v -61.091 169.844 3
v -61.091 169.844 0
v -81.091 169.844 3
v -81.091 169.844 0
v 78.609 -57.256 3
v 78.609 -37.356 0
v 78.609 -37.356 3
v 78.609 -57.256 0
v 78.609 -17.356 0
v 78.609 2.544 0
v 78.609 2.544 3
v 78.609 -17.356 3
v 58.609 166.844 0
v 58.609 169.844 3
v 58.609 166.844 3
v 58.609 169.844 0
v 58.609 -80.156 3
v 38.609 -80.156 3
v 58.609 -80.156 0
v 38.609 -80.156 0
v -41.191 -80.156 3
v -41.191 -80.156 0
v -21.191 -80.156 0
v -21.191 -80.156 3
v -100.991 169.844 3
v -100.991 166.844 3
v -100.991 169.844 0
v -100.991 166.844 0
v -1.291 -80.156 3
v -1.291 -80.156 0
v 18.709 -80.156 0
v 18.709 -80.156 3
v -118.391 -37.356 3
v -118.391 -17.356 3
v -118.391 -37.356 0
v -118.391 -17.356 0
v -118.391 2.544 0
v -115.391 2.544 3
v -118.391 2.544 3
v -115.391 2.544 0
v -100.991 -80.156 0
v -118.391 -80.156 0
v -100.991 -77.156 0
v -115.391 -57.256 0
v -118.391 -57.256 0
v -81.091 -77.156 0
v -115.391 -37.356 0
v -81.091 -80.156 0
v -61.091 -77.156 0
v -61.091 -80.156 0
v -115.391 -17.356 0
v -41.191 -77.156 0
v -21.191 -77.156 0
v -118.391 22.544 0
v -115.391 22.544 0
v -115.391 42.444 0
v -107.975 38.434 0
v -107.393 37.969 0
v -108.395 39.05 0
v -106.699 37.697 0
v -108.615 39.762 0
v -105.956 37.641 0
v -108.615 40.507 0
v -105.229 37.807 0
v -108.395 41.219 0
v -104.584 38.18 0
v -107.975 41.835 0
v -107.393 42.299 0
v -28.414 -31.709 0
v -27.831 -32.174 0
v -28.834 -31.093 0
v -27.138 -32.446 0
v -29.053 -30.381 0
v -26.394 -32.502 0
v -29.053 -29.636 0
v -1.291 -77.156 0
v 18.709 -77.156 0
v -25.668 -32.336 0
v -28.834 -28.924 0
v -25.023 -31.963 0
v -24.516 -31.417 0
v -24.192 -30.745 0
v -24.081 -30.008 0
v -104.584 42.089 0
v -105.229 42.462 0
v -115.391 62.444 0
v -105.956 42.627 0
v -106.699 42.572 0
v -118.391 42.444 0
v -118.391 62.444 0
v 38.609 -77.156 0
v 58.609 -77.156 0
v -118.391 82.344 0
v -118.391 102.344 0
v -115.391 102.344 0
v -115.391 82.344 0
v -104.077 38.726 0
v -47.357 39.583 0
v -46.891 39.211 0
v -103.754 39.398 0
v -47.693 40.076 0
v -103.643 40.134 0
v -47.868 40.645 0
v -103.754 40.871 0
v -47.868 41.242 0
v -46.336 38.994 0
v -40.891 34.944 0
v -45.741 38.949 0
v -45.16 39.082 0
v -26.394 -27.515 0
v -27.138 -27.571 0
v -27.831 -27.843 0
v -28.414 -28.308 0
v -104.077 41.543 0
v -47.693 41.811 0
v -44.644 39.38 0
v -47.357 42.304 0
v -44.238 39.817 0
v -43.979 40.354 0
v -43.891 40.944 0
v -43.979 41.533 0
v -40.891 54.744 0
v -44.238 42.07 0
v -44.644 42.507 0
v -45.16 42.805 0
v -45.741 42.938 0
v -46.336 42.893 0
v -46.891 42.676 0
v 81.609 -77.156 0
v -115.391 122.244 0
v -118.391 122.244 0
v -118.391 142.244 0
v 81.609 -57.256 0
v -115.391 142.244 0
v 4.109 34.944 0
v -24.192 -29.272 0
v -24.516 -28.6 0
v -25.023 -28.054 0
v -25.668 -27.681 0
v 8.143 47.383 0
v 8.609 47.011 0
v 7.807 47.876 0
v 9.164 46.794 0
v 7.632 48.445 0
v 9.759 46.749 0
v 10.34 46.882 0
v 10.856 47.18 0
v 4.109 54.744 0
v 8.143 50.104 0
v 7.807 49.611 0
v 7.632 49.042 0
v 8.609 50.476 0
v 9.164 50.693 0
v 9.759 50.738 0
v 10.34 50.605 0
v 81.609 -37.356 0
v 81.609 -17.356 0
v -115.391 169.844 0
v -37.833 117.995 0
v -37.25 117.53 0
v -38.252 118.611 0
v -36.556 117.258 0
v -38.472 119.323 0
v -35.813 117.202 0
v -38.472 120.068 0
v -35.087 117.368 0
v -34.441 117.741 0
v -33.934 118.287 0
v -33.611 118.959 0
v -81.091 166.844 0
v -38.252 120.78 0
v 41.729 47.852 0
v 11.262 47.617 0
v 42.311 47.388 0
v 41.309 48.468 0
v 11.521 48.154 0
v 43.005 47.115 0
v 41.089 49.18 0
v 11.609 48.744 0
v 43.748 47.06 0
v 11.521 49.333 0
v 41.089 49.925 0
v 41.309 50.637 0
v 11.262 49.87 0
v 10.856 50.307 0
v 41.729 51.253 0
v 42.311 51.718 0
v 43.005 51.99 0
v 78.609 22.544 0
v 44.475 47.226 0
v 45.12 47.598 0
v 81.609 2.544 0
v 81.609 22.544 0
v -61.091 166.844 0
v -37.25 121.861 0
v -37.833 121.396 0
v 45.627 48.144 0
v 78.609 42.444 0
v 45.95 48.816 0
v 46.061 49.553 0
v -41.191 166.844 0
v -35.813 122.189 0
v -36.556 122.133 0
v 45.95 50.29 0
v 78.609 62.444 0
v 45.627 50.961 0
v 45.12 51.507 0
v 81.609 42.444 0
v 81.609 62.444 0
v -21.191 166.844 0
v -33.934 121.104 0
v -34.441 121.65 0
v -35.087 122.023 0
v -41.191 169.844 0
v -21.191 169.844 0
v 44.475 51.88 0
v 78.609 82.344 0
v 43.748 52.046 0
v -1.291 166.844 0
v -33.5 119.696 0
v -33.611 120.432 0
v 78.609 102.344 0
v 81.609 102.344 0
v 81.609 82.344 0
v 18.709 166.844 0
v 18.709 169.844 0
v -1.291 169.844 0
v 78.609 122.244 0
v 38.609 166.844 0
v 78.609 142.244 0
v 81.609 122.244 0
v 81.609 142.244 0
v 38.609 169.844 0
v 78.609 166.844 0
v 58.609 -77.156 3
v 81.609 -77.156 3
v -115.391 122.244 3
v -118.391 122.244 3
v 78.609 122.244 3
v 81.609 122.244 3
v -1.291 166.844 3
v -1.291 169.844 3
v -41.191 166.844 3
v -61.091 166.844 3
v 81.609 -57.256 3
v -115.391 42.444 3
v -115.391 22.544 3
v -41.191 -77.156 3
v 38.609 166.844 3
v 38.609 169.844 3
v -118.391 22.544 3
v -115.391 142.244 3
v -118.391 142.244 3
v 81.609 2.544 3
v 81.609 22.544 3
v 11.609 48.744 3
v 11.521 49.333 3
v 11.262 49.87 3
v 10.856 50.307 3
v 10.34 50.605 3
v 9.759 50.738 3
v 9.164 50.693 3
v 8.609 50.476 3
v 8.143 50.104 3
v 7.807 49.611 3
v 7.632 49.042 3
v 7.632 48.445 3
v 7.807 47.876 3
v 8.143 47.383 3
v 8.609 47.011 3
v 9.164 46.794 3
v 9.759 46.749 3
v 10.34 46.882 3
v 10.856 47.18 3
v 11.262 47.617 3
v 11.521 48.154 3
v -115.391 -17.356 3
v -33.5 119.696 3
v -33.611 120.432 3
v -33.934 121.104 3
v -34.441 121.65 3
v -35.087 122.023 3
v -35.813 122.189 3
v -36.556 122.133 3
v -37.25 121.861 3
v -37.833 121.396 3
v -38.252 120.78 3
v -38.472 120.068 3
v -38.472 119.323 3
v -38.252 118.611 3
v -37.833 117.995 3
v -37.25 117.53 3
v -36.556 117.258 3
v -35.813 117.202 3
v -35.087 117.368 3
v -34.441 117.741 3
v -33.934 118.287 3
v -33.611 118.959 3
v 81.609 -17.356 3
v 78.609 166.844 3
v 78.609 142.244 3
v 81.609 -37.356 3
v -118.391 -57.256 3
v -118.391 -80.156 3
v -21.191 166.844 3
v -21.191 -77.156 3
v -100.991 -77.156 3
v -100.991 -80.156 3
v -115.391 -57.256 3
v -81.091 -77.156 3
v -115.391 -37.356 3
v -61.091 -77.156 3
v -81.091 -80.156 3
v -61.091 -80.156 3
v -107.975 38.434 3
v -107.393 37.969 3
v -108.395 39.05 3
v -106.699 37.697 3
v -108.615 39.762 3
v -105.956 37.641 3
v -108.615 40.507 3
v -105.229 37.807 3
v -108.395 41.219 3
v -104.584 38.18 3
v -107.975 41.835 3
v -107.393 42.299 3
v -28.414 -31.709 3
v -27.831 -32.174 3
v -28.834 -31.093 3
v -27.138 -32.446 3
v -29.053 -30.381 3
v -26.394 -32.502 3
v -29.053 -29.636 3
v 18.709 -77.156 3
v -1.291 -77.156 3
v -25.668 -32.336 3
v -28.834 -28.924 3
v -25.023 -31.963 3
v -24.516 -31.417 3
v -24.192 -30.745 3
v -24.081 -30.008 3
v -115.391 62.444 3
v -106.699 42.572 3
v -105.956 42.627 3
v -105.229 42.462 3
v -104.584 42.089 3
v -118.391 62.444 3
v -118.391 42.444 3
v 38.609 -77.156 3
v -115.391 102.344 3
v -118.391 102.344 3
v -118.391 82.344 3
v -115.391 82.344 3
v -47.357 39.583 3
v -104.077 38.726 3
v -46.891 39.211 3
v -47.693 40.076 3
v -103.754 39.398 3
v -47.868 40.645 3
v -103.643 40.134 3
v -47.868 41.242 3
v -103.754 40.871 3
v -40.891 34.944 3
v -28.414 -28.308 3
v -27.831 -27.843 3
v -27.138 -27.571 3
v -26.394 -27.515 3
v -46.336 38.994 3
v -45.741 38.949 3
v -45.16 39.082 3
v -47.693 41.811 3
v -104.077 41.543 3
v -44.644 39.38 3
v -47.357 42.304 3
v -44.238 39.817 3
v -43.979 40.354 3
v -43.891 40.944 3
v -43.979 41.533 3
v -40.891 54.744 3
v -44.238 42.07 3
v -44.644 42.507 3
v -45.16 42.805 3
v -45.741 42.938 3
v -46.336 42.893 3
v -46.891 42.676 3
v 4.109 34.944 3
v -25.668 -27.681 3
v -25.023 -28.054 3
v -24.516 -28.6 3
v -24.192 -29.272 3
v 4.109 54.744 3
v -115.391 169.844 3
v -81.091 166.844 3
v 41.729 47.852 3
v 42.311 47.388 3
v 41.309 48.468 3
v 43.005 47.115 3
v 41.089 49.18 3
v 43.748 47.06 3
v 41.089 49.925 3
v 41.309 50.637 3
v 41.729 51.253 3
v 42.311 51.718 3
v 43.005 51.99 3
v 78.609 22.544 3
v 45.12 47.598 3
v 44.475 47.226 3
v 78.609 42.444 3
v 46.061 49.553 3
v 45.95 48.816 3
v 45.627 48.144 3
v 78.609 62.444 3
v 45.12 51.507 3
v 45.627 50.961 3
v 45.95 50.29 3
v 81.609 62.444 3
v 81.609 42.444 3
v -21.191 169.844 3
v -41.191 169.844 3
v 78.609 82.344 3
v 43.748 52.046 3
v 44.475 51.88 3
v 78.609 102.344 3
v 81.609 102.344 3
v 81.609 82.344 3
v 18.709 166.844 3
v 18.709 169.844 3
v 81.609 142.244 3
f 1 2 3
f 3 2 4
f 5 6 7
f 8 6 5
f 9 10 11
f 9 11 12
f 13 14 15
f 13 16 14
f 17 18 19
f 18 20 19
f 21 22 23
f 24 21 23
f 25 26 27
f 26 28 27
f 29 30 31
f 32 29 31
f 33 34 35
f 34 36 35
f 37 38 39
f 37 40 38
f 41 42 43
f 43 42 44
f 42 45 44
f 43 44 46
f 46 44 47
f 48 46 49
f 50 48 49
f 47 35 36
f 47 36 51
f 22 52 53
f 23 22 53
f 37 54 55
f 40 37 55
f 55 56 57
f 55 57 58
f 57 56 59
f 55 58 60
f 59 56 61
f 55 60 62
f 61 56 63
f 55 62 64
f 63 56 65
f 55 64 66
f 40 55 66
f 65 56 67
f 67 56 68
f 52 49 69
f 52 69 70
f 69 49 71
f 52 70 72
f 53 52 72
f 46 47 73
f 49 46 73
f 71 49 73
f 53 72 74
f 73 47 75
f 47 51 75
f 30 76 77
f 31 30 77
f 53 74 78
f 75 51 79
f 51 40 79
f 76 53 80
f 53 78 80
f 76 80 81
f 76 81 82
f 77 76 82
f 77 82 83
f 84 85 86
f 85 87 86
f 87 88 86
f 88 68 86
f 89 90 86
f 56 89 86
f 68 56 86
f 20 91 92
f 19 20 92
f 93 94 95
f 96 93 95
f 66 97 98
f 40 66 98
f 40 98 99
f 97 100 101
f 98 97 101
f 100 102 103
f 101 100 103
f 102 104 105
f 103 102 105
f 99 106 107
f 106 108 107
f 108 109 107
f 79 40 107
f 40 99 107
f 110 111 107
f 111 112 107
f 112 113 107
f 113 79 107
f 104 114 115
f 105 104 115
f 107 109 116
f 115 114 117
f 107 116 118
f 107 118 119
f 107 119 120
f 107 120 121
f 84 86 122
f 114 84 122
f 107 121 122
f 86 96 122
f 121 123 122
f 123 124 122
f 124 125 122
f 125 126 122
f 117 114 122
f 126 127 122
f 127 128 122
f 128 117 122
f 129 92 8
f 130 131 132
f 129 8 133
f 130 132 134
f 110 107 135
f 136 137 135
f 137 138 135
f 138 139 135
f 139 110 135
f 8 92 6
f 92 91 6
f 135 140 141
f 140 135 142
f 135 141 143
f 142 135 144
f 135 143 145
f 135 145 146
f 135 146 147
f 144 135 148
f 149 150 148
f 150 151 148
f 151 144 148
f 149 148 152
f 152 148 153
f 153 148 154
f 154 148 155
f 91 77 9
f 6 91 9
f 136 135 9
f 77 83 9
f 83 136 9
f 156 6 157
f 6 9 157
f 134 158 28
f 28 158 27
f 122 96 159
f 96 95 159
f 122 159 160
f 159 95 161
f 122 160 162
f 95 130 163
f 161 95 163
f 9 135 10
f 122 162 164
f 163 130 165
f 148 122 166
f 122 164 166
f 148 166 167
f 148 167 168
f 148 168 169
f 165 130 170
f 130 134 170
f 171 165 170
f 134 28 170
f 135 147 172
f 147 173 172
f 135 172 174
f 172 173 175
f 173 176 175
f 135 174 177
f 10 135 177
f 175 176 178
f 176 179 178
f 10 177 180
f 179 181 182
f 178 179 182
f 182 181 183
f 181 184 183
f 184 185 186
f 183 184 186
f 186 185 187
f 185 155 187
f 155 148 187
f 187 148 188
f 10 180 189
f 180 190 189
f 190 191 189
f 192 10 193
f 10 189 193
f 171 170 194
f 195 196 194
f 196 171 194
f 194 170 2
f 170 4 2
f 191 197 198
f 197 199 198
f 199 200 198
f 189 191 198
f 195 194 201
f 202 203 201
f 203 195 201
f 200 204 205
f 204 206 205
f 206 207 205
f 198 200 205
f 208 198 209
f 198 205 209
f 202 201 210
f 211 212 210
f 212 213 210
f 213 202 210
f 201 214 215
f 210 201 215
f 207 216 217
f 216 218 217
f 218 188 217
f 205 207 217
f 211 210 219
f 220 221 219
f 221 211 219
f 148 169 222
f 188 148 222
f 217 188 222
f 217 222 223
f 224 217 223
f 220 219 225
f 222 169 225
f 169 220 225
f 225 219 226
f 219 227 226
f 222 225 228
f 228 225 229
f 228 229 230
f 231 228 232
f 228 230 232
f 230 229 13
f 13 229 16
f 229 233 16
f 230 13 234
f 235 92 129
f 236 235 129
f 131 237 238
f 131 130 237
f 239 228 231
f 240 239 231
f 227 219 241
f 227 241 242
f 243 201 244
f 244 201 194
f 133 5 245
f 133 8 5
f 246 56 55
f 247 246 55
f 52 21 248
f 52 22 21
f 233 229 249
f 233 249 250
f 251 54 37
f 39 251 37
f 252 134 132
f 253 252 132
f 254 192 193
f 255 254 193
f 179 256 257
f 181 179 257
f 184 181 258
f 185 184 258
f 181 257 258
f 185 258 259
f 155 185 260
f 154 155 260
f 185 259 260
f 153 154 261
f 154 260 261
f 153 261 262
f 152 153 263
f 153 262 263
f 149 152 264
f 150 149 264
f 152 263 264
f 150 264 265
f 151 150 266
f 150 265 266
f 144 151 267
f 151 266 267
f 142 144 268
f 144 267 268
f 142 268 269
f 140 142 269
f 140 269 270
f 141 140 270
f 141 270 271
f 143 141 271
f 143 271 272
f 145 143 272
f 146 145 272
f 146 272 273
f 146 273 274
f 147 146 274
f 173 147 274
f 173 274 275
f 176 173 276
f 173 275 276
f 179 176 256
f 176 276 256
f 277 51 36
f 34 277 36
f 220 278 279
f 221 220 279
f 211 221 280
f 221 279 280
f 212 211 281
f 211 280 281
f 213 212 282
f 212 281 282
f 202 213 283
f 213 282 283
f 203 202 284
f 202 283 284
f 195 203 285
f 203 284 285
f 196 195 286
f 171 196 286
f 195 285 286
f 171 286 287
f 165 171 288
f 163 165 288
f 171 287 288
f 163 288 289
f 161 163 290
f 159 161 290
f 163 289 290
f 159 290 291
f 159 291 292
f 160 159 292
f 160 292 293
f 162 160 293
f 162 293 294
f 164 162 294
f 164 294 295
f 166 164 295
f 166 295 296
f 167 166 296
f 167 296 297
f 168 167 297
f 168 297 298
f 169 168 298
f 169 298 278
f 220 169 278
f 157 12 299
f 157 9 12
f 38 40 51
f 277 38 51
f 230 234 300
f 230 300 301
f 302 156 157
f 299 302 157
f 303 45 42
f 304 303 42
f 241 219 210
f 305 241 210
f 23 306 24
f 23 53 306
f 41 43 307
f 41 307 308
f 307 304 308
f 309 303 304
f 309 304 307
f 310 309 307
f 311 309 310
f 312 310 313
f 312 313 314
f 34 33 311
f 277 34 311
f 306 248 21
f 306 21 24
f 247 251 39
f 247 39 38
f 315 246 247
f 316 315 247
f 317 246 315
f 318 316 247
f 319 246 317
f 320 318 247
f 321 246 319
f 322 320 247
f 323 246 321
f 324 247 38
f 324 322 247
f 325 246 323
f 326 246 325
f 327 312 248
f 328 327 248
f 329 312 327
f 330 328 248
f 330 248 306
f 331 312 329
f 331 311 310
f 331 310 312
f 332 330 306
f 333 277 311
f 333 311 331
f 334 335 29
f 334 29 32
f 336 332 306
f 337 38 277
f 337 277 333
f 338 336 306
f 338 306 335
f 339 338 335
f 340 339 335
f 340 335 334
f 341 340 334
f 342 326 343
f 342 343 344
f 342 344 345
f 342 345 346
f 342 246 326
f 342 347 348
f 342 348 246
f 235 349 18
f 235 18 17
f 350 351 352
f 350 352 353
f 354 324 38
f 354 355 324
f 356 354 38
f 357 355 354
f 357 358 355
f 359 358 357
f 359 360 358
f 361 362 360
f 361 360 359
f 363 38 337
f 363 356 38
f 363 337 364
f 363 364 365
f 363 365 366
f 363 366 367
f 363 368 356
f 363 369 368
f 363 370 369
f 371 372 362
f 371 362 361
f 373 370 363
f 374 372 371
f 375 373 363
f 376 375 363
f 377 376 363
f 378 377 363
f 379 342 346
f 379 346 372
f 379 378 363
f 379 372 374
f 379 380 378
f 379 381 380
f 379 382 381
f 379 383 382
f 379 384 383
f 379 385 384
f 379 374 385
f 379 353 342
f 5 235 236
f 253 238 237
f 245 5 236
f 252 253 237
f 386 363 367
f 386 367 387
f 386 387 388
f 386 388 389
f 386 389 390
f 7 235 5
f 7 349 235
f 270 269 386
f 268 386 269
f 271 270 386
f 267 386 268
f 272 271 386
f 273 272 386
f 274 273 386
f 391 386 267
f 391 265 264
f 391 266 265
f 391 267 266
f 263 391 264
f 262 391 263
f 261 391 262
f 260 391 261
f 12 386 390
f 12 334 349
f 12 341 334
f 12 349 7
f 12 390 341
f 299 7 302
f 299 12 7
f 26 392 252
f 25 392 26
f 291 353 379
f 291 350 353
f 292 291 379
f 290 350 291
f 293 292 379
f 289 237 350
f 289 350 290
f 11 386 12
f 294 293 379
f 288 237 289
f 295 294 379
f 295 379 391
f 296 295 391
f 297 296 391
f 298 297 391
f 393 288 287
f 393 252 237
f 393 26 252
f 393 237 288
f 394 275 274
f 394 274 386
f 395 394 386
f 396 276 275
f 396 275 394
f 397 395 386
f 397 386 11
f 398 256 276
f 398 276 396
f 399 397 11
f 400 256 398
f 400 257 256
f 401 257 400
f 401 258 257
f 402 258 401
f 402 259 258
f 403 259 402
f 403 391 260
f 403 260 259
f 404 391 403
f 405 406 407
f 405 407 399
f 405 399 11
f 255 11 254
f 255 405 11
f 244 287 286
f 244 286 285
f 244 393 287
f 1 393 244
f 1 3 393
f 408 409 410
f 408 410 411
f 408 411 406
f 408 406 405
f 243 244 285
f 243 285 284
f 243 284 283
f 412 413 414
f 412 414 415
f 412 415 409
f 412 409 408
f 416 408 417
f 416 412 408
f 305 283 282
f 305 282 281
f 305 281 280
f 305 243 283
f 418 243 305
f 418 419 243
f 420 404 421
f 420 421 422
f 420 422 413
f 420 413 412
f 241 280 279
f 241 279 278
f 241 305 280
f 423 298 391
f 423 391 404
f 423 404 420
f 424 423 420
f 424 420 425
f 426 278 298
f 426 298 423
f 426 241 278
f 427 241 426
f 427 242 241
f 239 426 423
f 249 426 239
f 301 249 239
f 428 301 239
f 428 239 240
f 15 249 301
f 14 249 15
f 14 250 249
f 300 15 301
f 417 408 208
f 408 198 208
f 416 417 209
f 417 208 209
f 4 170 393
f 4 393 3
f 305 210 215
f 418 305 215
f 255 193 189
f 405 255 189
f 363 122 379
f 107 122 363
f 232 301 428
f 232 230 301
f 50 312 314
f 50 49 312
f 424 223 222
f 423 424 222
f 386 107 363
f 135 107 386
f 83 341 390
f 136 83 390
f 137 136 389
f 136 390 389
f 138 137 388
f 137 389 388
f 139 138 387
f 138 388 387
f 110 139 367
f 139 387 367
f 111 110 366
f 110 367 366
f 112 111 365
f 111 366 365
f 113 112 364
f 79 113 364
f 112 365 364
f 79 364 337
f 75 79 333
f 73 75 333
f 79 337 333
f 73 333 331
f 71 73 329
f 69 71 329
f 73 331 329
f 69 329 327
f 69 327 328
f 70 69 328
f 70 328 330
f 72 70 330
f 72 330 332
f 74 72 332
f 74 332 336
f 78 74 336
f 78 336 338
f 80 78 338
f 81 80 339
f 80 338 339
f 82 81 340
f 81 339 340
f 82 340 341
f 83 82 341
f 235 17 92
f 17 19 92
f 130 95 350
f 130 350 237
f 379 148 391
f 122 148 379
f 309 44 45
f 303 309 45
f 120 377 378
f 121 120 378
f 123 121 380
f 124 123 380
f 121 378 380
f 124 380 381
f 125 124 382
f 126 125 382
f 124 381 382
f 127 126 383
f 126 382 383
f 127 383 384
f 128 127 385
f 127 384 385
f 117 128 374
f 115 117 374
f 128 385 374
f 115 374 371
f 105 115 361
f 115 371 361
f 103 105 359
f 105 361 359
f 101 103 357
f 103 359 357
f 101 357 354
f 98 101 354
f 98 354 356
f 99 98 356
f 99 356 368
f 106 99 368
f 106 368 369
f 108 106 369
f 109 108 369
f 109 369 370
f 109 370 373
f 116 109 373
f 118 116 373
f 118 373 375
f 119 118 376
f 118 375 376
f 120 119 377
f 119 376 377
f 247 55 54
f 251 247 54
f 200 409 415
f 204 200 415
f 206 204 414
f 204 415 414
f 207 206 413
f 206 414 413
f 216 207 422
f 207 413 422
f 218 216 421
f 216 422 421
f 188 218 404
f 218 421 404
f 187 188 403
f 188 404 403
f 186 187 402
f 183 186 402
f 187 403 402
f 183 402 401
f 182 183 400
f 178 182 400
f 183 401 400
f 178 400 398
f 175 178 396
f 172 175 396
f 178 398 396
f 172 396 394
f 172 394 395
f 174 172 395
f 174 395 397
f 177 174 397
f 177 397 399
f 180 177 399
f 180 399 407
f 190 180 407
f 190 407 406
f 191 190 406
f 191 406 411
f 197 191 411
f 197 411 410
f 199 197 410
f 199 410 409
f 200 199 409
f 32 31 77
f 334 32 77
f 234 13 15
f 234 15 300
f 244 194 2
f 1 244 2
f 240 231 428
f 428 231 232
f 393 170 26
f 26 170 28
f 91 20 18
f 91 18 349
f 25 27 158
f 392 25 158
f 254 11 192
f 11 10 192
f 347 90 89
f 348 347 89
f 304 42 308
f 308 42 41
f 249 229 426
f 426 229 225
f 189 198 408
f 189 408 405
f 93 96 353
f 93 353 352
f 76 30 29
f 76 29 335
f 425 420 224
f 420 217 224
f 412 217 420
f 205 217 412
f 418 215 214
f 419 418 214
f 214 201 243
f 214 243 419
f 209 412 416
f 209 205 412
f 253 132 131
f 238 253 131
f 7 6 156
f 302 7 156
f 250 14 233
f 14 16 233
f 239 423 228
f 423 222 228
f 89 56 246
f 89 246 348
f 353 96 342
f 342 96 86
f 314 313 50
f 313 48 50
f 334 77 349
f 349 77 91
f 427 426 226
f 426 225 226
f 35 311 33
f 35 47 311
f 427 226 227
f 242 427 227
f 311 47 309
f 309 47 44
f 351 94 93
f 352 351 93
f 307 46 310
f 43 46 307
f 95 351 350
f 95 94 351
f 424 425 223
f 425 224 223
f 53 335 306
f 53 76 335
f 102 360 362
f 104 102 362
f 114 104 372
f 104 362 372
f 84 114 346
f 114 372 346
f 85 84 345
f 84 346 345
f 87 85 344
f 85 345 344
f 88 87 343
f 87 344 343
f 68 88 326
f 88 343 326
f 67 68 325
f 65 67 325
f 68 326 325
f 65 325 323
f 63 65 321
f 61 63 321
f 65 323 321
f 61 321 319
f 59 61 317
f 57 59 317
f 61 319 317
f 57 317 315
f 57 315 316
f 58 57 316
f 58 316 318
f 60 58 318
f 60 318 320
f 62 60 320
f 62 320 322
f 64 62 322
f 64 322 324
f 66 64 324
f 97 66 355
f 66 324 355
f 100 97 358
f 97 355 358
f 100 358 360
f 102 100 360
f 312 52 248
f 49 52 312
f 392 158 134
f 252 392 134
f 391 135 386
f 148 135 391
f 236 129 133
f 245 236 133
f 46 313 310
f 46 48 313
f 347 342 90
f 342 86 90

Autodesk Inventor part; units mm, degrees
ref_plane "YZ Plane" through (0, 0, 0) normal (1, 0, 0) x (0, 1, 0)
ref_plane "XZ Plane" through (0, 0, 0) normal (0, 1, 0) x (-1, 0, 0)
ref_plane "XY Plane" through (0, 0, 0) normal (0, 0, 1) x (1, 0, 0)
sketch "Sketch1" plane through (0, 0, 0) normal (0, 0, 1) x (1, 0, 0)
  line L0 (81.6094, 169.8435) -> (-118.3906, 169.8435)
  line L1 (-118.3906, 169.8435) -> (-118.3906, -80.1565)
  line L2 (-118.3906, -80.1565) -> (81.6094, -80.1565)
  line L3 (81.6094, -80.1565) -> (81.6094, 169.8435)
  line L4 (81.6094, 169.8435) -> (58.6094, 169.8435)
  line L5 (58.6094, 169.8435) -> (58.6094, 166.8435)
  line L6 (58.6094, 166.8435) -> (81.6094, 166.8435)
  line L7 (81.6094, 166.8435) -> (81.6094, 169.8435)
  line L8 (58.6094, 166.8435) -> (38.6094, 166.8435)
  line L9 (38.6094, 166.8435) -> (38.6094, 169.8435)
  line L10 (38.6094, 169.8435) -> (58.6094, 169.8435)
  line L11 (58.6094, 169.8435) -> (58.6094, 166.8435)
  line L12 (38.6094, 166.8435) -> (18.7094, 166.8435)
  line L13 (18.7094, 166.8435) -> (18.7094, 169.8435)
  line L14 (18.7094, 169.8435) -> (38.6094, 169.8435)
  line L15 (38.6094, 169.8435) -> (38.6094, 166.8435)
  line L16 (18.7094, 166.8435) -> (-1.2906, 166.8435)
  line L17 (-1.2906, 166.8435) -> (-1.2906, 169.8435)
  line L18 (-1.2906, 169.8435) -> (18.7094, 169.8435)
  line L19 (18.7094, 169.8435) -> (18.7094, 166.8435)
  line L20 (-1.2906, 166.8435) -> (-21.1906, 166.8435)
  line L21 (-21.1906, 166.8435) -> (-21.1906, 169.8435)
  line L22 (-21.1906, 169.8435) -> (-1.2906, 169.8435)
  line L23 (-1.2906, 169.8435) -> (-1.2906, 166.8435)
  line L24 (-21.1906, 166.8435) -> (-41.1906, 166.8435)
  line L25 (-41.1906, 166.8435) -> (-41.1906, 169.8435)
  line L26 (-41.1906, 169.8435) -> (-21.1906, 169.8435)
  line L27 (-21.1906, 169.8435) -> (-21.1906, 166.8435)
  line L28 (-111.1906, 169.8435) -> (-91.1906, 169.8435)
  line L29 (-91.1906, 169.8435) -> (-118.3906, 169.8435)
  line L30 (-118.3906, 169.8435) -> (-118.3906, 166.8435)
  line L31 (-118.3906, 166.8435) -> (-115.3906, 166.8435)
  line L32 (-118.3906, 142.8435) -> (-118.3906, 166.8435)
  line L33 (-118.3906, 169.8435) -> (-115.3906, 169.8435)
  line L34 (-115.3906, 169.8435) -> (-115.3906, 142.2435)
  line L35 (-115.3906, 142.2435) -> (-118.3906, 142.2435)
  line L36 (-118.3906, 142.2435) -> (-118.3906, 169.8435)
  line L37 (-118.3906, 142.2435) -> (-115.3906, 142.2435)
  line L38 (-115.3906, 142.2435) -> (-115.3906, 122.2435)
  line L39 (-115.3906, 122.2435) -> (-118.3906, 122.2435)
  line L40 (-118.3906, 122.2435) -> (-118.3906, 142.2435)
  line L41 (-115.3906, 122.2435) -> (-118.3906, 122.2435)
  line L42 (-118.3906, 122.2435) -> (-118.3906, 102.3435)
  line L43 (-118.3906, 102.3435) -> (-115.3906, 102.3435)
  line L44 (-115.3906, 102.3435) -> (-115.3906, 122.2435)
  line L45 (-118.3906, 102.3435) -> (-115.3906, 102.3435)
  line L46 (-115.3906, 102.3435) -> (-115.3906, 82.3435)
  line L47 (-115.3906, 82.3435) -> (-118.3906, 82.3435)
  line L48 (-118.3906, 82.3435) -> (-118.3906, 102.3435)
  line L49 (-118.3906, 82.3435) -> (-115.3906, 82.3435)
  line L50 (-115.3906, 82.3435) -> (-115.3906, 62.4435)
  line L51 (-115.3906, 62.4435) -> (-118.3906, 62.4435)
  line L52 (-118.3906, 62.4435) -> (-118.3906, 82.3435)
  line L53 (-118.3906, 62.4435) -> (-115.3906, 62.4435)
  line L54 (-115.3906, 62.4435) -> (-115.3906, 42.4435)
  line L55 (-115.3906, 42.4435) -> (-118.3906, 42.4435)
  line L56 (-118.3906, 42.4435) -> (-118.3906, 62.4435)
  line L57 (-118.3906, 42.4435) -> (-115.3906, 42.4435)
  line L58 (-115.3906, 42.4435) -> (-115.3906, 22.5435)
  line L59 (-115.3906, 22.5435) -> (-118.3906, 22.5435)
  line L60 (-118.3906, 22.5435) -> (-118.3906, 42.4435)
  line L61 (-118.3906, 22.5435) -> (-115.3906, 22.5435)
  line L62 (-115.3906, 22.5435) -> (-115.3906, 2.5435)
  line L63 (-115.3906, 2.5435) -> (-118.3906, 2.5435)
  line L64 (-118.3906, 2.5435) -> (-118.3906, 22.5435)
  line L65 (-118.3906, 2.5435) -> (-115.3906, 2.5435)
  line L66 (-115.3906, 2.5435) -> (-115.3906, -17.3565)
  line L67 (-115.3906, -17.3565) -> (-118.3906, -17.3565)
  line L68 (-118.3906, -17.3565) -> (-118.3906, 2.5435)
  line L69 (-118.3906, -17.3565) -> (-115.3906, -17.3565)
  line L70 (-115.3906, -17.3565) -> (-115.3906, -37.3565)
  line L71 (-115.3906, -37.3565) -> (-118.3906, -37.3565)
  line L72 (-118.3906, -37.3565) -> (-118.3906, -17.3565)
  line L73 (-118.3906, -37.3565) -> (-115.3906, -37.3565)
  line L74 (-115.3906, -37.3565) -> (-115.3906, -57.2565)
  line L75 (-115.3906, -57.2565) -> (-118.3906, -57.2565)
  line L76 (-118.3906, -57.2565) -> (-118.3906, -37.3565)
  line L77 (-118.3906, -57.2565) -> (-115.3906, -57.2565)
  line L78 (-115.3906, -57.2565) -> (-115.3906, -77.2565)
  line L79 (-115.3906, -77.2565) -> (-118.3906, -77.2565)
  line L80 (-118.3906, -77.2565) -> (-118.3906, -57.2565)
  line L81 (81.6094, 169.8435) -> (81.6094, -80.1565)
  line L82 (81.6094, 169.8435) -> (81.6094, 166.8435)
  line L83 (81.6094, 166.8435) -> (78.6094, 166.8435)
  line L84 (81.6094, 169.8435) -> (78.6094, 169.8435)
  line L85 (78.6094, 169.8435) -> (78.6094, 142.2435)
  line L86 (81.6094, 142.2435) -> (81.6094, 169.8435)
  line L87 (81.6094, 142.8435) -> (81.6094, 166.8435)
  line L88 (78.6094, 142.2435) -> (81.6094, 142.2435)
  line L89 (81.6094, 142.2435) -> (78.6094, 142.2435)
  line L90 (78.6094, 142.2435) -> (78.6094, 122.2435)
  line L91 (78.6094, 122.2435) -> (81.6094, 122.2435)
  line L92 (78.6094, 122.2435) -> (81.6094, 122.2435)
  line L93 (81.6094, 122.2435) -> (81.6094, 142.2435)
  line L94 (78.6094, 102.3435) -> (78.6094, 122.2435)
  line L95 (81.6094, 122.2435) -> (81.6094, 102.3435)
  line L96 (81.6094, 102.3435) -> (78.6094, 102.3435)
  line L97 (81.6094, 102.3435) -> (78.6094, 102.3435)
  line L98 (78.6094, 102.3435) -> (78.6094, 82.3435)
  line L99 (81.6094, 82.3435) -> (81.6094, 102.3435)
  line L100 (78.6094, 82.3435) -> (81.6094, 82.3435)
  line L101 (81.6094, 82.3435) -> (78.6094, 82.3435)
  line L102 (78.6094, 82.3435) -> (78.6094, 62.4435)
  line L103 (81.6094, 62.4435) -> (81.6094, 82.3435)
  line L104 (78.6094, 62.4435) -> (81.6094, 62.4435)
  line L105 (81.6094, 62.4435) -> (78.6094, 62.4435)
  line L106 (78.6094, 62.4435) -> (78.6094, 42.4435)
  line L107 (81.6094, 42.4435) -> (81.6094, 62.4435)
  line L108 (78.6094, 42.4435) -> (81.6094, 42.4435)
  line L109 (81.6094, 42.4435) -> (78.6094, 42.4435)
  line L110 (81.6094, 22.5435) -> (81.6094, 42.4435)
  line L111 (78.6094, 42.4435) -> (78.6094, 22.5435)
  line L112 (78.6094, 2.5435) -> (81.6094, 2.5435)
  line L113 (81.6094, 2.5435) -> (78.6094, 2.5435)
  line L114 (81.6094, 22.5435) -> (78.6094, 22.5435)
  line L115 (81.6094, 2.5435) -> (81.6094, 22.5435)
  line L116 (78.6094, 22.5435) -> (78.6094, 2.5435)
  line L117 (78.6094, 2.5435) -> (78.6094, -17.3565)
  line L118 (81.6094, -17.3565) -> (81.6094, 2.5435)
  line L119 (78.6094, 22.5435) -> (81.6094, 22.5435)
  line L120 (78.6094, -17.3565) -> (78.6094, -37.3565)
  line L121 (78.6094, -17.3565) -> (81.6094, -17.3565)
  line L122 (81.6094, -37.3565) -> (81.6094, -17.3565)
  line L123 (78.6094, -57.2565) -> (81.6094, -57.2565)
  line L124 (81.6094, -57.2565) -> (78.6094, -57.2565)
  line L125 (78.6094, -37.3565) -> (78.6094, -57.2565)
  line L126 (81.6094, -57.2565) -> (81.6094, -37.3565)
  line L127 (78.6094, -77.2565) -> (81.6094, -77.2565)
  line L128 (78.6094, -57.2565) -> (78.6094, -77.2565)
  line L129 (81.6094, -77.2565) -> (81.6094, -57.2565)
  line L130 (81.6094, -17.3565) -> (78.6094, -17.3565)
  line L131 (78.6094, -37.3565) -> (81.6094, -37.3565)
  line L132 (81.6094, -37.3565) -> (78.6094, -37.3565)
  line L133 (81.6094, -80.1565) -> (58.6094, -80.1565)
  line L134 (58.6094, -80.1565) -> (58.6094, -77.1565)
  line L135 (58.6094, -77.1565) -> (81.6094, -77.1565)
  line L136 (81.6094, -77.1565) -> (81.6094, -80.1565)
  line L137 (58.6094, -80.1565) -> (38.6094, -80.1565)
  line L138 (38.6094, -80.1565) -> (38.6094, -77.1565)
  line L139 (38.6094, -77.1565) -> (58.6094, -77.1565)
  line L140 (58.6094, -77.1565) -> (58.6094, -80.1565)
  line L141 (38.6094, -80.1565) -> (18.7094, -80.1565)
  line L142 (18.7094, -80.1565) -> (18.7094, -77.1565)
  line L143 (18.7094, -77.1565) -> (38.6094, -77.1565)
  line L144 (38.6094, -77.1565) -> (38.6094, -80.1565)
  line L145 (18.7094, -80.1565) -> (-1.2906, -80.1565)
  line L146 (-1.2906, -80.1565) -> (-1.2906, -77.1565)
  line L147 (-1.2906, -77.1565) -> (18.7094, -77.1565)
  line L148 (18.7094, -77.1565) -> (18.7094, -80.1565)
  line L149 (-1.2906, -77.1565) -> (-21.1906, -77.1565)
  line L150 (-21.1906, -77.1565) -> (-21.1906, -80.1565)
  line L151 (-21.1906, -80.1565) -> (-1.2906, -80.1565)
  line L152 (-1.2906, -80.1565) -> (-1.2906, -77.1565)
  line L153 (-21.1906, -80.1565) -> (-41.1906, -80.1565)
  line L154 (-41.1906, -80.1565) -> (-41.1906, -77.1565)
  line L155 (-41.1906, -77.1565) -> (-21.1906, -77.1565)
  line L156 (-21.1906, -77.1565) -> (-21.1906, -80.1565)
  line L157 (-41.1906, -77.1565) -> (-111.0906, -77.1565)
  line L158 (-61.0906, -80.1565) -> (-41.1906, -80.1565)
  line L159 (-41.1906, -80.1565) -> (-41.1906, -77.1565)
  line L160 (-111.0906, -77.1565) -> (-118.3906, -77.1565)
  line L161 (-118.3906, -77.1565) -> (-118.3906, -80.1565)
  line L162 (-118.3906, -80.1565) -> (-61.0906, -80.1565)
  line L163 (-61.0906, -80.1565) -> (-81.0906, -80.1565)
  line L164 (-81.0906, -80.1565) -> (-81.0906, -77.1565)
  line L165 (-81.0906, -77.1565) -> (-61.0906, -77.1565)
  line L166 (-61.0906, -77.1565) -> (-61.0906, -80.1565)
  line L167 (-81.0906, -77.1565) -> (-100.9906, -77.1565)
  line L168 (-100.9906, -77.1565) -> (-100.9906, -80.1565)
  line L169 (-100.9906, -80.1565) -> (-81.0906, -80.1565)
  line L170 (-81.0906, -80.1565) -> (-81.0906, -77.1565)
  line L171 (-41.1906, 166.8435) -> (-61.0906, 166.8435)
  line L172 (-61.0906, 166.8435) -> (-61.0906, 169.8435)
  line L173 (-61.0906, 169.8435) -> (-41.1906, 169.8435)
  line L174 (-41.1906, 169.8435) -> (-41.1906, 166.8435)
  line L175 (-61.0906, 166.8435) -> (-81.0906, 166.8435)
  line L176 (-81.0906, 166.8435) -> (-81.0906, 169.8435)
  line L177 (-81.0906, 169.8435) -> (-61.0906, 169.8435)
  line L178 (-61.0906, 169.8435) -> (-61.0906, 166.8435)
  line L179 (-81.0906, 166.8435) -> (-100.9906, 166.8435)
  line L180 (-100.9906, 166.8435) -> (-100.9906, 169.8435)
  line L181 (-100.9906, 169.8435) -> (-81.0906, 169.8435)
  line L182 (-81.0906, 169.8435) -> (-81.0906, 166.8435)
  line L183 (-100.9906, 166.8435) -> (-118.3906, 166.8435)
  line L184 (-118.3906, 166.8435) -> (-118.3906, 169.8435)
  line L185 (-118.3906, 169.8435) -> (-100.9906, 169.8435)
  line L186 (-100.9906, 169.8435) -> (-100.9906, 166.8435)
  line L187 (-40.8906, 34.9435) -> (4.1094, 34.9435)
  line L188 (4.1094, 34.9435) -> (4.1094, 54.7435)
  line L189 (4.1094, 54.7435) -> (-40.8906, 54.7435)
  line L190 (-40.8906, 54.7435) -> (-40.8906, 34.9435)
  point P0 (0, 0)
  point P1 (6.6094, -153.3151)
  point P2 (74.4094, 169.8435)
  point P3 (-115.3906, 2.5435)
  point P4 (-115.3906, -77.1565)
  point P5 (78.6094, -77.1565)
  point P6 (38.6094, 169.8435)
  point P7 (-118.3906, -57.2565)
  point P8 (-118.3906, -77.2565)
  point P9 (-118.3906, -17.3565)
  point P10 (-118.3906, -37.3565)
  point P11 (-118.3906, 22.5435)
  point P12 (-118.3906, 2.5435)
  point P13 (-118.3906, 42.4435)
  point P14 (-118.3906, 142.2435)
  point P15 (-118.3906, 122.2435)
  point P16 (-115.3906, -37.3565)
  point P17 (-118.3906, -77.1565)
  point P18 (-118.3906, 42.4435)
  point P19 (-118.3906, 22.5435)
  point P20 (-118.3906, 2.5435)
  point P21 (-118.3906, -17.3565)
  point P22 (-115.3906, 169.8435)
  point P23 (-118.3906, 44.8435)
  point P24 (-40.8906, 44.8435)
  point P25 (-31.1906, -80.1565)
  dimension "d0" = 200
  dimension "d1" = 250
  dimension "d2" = 23
  dimension "d3" = 3
  dimension "d4" = 20
  dimension "d5" = 19.9
  dimension "d6" = 20
  dimension "d7" = 19.9
  dimension "d8" = 20
  dimension "d9" = 3
  dimension "d10" = 27.6
  dimension "d11" = 3
  dimension "d12" = 20
  dimension "d13" = 19.9
  dimension "d14" = 20
  dimension "d15" = 19.9
  dimension "d16" = 20
  dimension "d17" = 19.9
  dimension "d18" = 20
  dimension "d19" = 19.9
  dimension "d20" = 20
  dimension "d21" = 3
  dimension "d22" = 19.9
  dimension "d23" = 20
  dimension "d24" = 23
  dimension "d25" = 3
  dimension "d26" = 20
  dimension "d27" = 19.9
  dimension "d28" = 19.9
  dimension "d29" = 19.9
  dimension "d32" = 20
  dimension "d33" = 19.9
  dimension "d34" = 19.9
  dimension "d35" = 20
  dimension "d36" = 19.9
  dimension "d37" = 45
  dimension "d38" = 19.8
  dimension "d39" = 77.5
  dimension "d40" = 115.1
extrude "Extrusion1" add sketch "Sketch1" along normal blind 3 contours L5 L8 L9 L0 | L85 L90 L94 L98 L102 L106 L111 L116 L117 L120 L125 L128 L135 L139 L143 L147 L149 L155 L157 L160 L78 L74 L70 L66 L62 L58 L54 L50 L46 L44 L38 L34 L183 L179 L175 L171 L24 L20 L16 L12 L8 L6 | L88 L3 L91 L90 | L13 L16 L17 L0 | L96 L3 L100 L98 | L21 L24 L25 L0 | L104 L3 L108 L106 | L172 L175 L176 L0 | L114 L3 L112 L116 | L180 L183 L34 L0 | L121 L3 L131 L120 | L38 L39 L1 L35 | L123 L3 L135 L128 | L46 L47 L1 L43 | L134 L2 L138 L139 | L54 L55 L1 L51 | L142 L2 L146 L147 | L62 L63 L1 L59 | L150 L2 L154 L155 | L70 L71 L1 L67 | L166 L2 L164 L157 | L78 L160 L1 L75 | L168 L2 L1 L79 L78 L160 L157 | L78 L79 L1 L160 | L190 L189 L188 L187
extrude "Extrusion2" cut sketch "Sketch1" along normal blind 3 contours L190 L189 L188 L187
sketch "Sketch2" plane through (0, 0, 3) normal (0, 0, 1) x (1, 0, 0)
  circle A0 centre (-31.2906, 44.8435) radius 75
  line L0 (-31.2906, 44.8435) -> (56.203, 50.348)
  line L1 (56.203, 50.348) -> (-118.9373, 39.3294)
  line L2 (-31.2906, 44.8435) -> (-24.9201, -56.4117)
  line L3 (-31.2906, 44.8435) -> (70.1649, 44.8435) construction
  line L4 (-24.9201, -56.4117) -> (-36.9493, 134.7868)
  circle A1 centre (43.5614, 49.5527) radius 2.5
  circle A2 centre (-106.1426, 40.1344) radius 2.5
  circle A3 centre (-35.9999, 119.6955) radius 2.5
  circle A4 centre (-26.5813, -30.0085) radius 2.5
  line L5 (4.1094, 34.9435) -> (-40.8906, 34.9435) projected
  line L6 (-40.8906, 54.7435) -> (4.1094, 54.7435) projected
  line L7 (4.1094, 34.9435) -> (-40.8906, 34.9435)
  line L8 (-40.8906, 34.9435) -> (-40.8906, 54.7435)
  line L9 (-40.8906, 54.7435) -> (4.1094, 54.7435)
  line L10 (4.1094, 54.7435) -> (4.1094, 34.9435)
  line L11 (-40.8906, 34.9435) -> (-40.8906, 54.7435) projected
  circle A5 centre (-31.2906, 44.8435) radius 1.6
  point P0 (0, 0)
  dimension "d43" = 150
  dimension "d44" = 86.4
  dimension "d45" = 5
  dimension "d46" = 5
  dimension "d47" = 5
  dimension "d48" = 5
  dimension "d49" = 9.9
  dimension "d50" = 9.6
  dimension "d51" = 3.2
extrude "Extrusion3" cut sketch "Sketch2" against normal blind 3 contours A1 L0 A0 | A0 L0 A1 | A4 L2 A0 | A0 L2 A4 | L0 A1 A0 | A0 A1 L0 | L2 A4 A0 | A0 A4 L2 | A3 L4 A0 | A0 L4 A3 | A2 L1 A0 | A0 L1 A2 | L4 A3 A0 | A0 A3 L4 | L1 A2 A0 | A0 A2 L1
sketch "Sketch3" plane through (0, 0, 3) normal (0, 0, 1) x (1, 0, 0)
  circle A0 centre (-45.8906, 40.9435) radius 2
  circle A1 centre (9.6094, 48.7435) radius 2
  line L0 (-40.8906, 34.9435) -> (-40.8906, 54.7435) projected
  line L1 (4.1094, 54.7435) -> (4.1094, 34.9435) projected
  line L2 (-40.8906, 54.7435) -> (4.1094, 54.7435) projected
  line L3 (4.1094, 34.9435) -> (-40.8906, 34.9435) projected
  point P0 (0, 0)
  dimension "d54" = 4
  dimension "d55" = 4
  dimension "d56" = 5
  dimension "d57" = 5.5
  dimension "d58" = 6
  dimension "d59" = 6
extrude "Extrusion4" cut sketch "Sketch3" against normal blind 3 contours A0 | A1
equation "\"d39\" = -0.5 * d37 + 0.5 * d0"
equation "\"d40\" = -0.5 * d38 + 0.5 * d1"
